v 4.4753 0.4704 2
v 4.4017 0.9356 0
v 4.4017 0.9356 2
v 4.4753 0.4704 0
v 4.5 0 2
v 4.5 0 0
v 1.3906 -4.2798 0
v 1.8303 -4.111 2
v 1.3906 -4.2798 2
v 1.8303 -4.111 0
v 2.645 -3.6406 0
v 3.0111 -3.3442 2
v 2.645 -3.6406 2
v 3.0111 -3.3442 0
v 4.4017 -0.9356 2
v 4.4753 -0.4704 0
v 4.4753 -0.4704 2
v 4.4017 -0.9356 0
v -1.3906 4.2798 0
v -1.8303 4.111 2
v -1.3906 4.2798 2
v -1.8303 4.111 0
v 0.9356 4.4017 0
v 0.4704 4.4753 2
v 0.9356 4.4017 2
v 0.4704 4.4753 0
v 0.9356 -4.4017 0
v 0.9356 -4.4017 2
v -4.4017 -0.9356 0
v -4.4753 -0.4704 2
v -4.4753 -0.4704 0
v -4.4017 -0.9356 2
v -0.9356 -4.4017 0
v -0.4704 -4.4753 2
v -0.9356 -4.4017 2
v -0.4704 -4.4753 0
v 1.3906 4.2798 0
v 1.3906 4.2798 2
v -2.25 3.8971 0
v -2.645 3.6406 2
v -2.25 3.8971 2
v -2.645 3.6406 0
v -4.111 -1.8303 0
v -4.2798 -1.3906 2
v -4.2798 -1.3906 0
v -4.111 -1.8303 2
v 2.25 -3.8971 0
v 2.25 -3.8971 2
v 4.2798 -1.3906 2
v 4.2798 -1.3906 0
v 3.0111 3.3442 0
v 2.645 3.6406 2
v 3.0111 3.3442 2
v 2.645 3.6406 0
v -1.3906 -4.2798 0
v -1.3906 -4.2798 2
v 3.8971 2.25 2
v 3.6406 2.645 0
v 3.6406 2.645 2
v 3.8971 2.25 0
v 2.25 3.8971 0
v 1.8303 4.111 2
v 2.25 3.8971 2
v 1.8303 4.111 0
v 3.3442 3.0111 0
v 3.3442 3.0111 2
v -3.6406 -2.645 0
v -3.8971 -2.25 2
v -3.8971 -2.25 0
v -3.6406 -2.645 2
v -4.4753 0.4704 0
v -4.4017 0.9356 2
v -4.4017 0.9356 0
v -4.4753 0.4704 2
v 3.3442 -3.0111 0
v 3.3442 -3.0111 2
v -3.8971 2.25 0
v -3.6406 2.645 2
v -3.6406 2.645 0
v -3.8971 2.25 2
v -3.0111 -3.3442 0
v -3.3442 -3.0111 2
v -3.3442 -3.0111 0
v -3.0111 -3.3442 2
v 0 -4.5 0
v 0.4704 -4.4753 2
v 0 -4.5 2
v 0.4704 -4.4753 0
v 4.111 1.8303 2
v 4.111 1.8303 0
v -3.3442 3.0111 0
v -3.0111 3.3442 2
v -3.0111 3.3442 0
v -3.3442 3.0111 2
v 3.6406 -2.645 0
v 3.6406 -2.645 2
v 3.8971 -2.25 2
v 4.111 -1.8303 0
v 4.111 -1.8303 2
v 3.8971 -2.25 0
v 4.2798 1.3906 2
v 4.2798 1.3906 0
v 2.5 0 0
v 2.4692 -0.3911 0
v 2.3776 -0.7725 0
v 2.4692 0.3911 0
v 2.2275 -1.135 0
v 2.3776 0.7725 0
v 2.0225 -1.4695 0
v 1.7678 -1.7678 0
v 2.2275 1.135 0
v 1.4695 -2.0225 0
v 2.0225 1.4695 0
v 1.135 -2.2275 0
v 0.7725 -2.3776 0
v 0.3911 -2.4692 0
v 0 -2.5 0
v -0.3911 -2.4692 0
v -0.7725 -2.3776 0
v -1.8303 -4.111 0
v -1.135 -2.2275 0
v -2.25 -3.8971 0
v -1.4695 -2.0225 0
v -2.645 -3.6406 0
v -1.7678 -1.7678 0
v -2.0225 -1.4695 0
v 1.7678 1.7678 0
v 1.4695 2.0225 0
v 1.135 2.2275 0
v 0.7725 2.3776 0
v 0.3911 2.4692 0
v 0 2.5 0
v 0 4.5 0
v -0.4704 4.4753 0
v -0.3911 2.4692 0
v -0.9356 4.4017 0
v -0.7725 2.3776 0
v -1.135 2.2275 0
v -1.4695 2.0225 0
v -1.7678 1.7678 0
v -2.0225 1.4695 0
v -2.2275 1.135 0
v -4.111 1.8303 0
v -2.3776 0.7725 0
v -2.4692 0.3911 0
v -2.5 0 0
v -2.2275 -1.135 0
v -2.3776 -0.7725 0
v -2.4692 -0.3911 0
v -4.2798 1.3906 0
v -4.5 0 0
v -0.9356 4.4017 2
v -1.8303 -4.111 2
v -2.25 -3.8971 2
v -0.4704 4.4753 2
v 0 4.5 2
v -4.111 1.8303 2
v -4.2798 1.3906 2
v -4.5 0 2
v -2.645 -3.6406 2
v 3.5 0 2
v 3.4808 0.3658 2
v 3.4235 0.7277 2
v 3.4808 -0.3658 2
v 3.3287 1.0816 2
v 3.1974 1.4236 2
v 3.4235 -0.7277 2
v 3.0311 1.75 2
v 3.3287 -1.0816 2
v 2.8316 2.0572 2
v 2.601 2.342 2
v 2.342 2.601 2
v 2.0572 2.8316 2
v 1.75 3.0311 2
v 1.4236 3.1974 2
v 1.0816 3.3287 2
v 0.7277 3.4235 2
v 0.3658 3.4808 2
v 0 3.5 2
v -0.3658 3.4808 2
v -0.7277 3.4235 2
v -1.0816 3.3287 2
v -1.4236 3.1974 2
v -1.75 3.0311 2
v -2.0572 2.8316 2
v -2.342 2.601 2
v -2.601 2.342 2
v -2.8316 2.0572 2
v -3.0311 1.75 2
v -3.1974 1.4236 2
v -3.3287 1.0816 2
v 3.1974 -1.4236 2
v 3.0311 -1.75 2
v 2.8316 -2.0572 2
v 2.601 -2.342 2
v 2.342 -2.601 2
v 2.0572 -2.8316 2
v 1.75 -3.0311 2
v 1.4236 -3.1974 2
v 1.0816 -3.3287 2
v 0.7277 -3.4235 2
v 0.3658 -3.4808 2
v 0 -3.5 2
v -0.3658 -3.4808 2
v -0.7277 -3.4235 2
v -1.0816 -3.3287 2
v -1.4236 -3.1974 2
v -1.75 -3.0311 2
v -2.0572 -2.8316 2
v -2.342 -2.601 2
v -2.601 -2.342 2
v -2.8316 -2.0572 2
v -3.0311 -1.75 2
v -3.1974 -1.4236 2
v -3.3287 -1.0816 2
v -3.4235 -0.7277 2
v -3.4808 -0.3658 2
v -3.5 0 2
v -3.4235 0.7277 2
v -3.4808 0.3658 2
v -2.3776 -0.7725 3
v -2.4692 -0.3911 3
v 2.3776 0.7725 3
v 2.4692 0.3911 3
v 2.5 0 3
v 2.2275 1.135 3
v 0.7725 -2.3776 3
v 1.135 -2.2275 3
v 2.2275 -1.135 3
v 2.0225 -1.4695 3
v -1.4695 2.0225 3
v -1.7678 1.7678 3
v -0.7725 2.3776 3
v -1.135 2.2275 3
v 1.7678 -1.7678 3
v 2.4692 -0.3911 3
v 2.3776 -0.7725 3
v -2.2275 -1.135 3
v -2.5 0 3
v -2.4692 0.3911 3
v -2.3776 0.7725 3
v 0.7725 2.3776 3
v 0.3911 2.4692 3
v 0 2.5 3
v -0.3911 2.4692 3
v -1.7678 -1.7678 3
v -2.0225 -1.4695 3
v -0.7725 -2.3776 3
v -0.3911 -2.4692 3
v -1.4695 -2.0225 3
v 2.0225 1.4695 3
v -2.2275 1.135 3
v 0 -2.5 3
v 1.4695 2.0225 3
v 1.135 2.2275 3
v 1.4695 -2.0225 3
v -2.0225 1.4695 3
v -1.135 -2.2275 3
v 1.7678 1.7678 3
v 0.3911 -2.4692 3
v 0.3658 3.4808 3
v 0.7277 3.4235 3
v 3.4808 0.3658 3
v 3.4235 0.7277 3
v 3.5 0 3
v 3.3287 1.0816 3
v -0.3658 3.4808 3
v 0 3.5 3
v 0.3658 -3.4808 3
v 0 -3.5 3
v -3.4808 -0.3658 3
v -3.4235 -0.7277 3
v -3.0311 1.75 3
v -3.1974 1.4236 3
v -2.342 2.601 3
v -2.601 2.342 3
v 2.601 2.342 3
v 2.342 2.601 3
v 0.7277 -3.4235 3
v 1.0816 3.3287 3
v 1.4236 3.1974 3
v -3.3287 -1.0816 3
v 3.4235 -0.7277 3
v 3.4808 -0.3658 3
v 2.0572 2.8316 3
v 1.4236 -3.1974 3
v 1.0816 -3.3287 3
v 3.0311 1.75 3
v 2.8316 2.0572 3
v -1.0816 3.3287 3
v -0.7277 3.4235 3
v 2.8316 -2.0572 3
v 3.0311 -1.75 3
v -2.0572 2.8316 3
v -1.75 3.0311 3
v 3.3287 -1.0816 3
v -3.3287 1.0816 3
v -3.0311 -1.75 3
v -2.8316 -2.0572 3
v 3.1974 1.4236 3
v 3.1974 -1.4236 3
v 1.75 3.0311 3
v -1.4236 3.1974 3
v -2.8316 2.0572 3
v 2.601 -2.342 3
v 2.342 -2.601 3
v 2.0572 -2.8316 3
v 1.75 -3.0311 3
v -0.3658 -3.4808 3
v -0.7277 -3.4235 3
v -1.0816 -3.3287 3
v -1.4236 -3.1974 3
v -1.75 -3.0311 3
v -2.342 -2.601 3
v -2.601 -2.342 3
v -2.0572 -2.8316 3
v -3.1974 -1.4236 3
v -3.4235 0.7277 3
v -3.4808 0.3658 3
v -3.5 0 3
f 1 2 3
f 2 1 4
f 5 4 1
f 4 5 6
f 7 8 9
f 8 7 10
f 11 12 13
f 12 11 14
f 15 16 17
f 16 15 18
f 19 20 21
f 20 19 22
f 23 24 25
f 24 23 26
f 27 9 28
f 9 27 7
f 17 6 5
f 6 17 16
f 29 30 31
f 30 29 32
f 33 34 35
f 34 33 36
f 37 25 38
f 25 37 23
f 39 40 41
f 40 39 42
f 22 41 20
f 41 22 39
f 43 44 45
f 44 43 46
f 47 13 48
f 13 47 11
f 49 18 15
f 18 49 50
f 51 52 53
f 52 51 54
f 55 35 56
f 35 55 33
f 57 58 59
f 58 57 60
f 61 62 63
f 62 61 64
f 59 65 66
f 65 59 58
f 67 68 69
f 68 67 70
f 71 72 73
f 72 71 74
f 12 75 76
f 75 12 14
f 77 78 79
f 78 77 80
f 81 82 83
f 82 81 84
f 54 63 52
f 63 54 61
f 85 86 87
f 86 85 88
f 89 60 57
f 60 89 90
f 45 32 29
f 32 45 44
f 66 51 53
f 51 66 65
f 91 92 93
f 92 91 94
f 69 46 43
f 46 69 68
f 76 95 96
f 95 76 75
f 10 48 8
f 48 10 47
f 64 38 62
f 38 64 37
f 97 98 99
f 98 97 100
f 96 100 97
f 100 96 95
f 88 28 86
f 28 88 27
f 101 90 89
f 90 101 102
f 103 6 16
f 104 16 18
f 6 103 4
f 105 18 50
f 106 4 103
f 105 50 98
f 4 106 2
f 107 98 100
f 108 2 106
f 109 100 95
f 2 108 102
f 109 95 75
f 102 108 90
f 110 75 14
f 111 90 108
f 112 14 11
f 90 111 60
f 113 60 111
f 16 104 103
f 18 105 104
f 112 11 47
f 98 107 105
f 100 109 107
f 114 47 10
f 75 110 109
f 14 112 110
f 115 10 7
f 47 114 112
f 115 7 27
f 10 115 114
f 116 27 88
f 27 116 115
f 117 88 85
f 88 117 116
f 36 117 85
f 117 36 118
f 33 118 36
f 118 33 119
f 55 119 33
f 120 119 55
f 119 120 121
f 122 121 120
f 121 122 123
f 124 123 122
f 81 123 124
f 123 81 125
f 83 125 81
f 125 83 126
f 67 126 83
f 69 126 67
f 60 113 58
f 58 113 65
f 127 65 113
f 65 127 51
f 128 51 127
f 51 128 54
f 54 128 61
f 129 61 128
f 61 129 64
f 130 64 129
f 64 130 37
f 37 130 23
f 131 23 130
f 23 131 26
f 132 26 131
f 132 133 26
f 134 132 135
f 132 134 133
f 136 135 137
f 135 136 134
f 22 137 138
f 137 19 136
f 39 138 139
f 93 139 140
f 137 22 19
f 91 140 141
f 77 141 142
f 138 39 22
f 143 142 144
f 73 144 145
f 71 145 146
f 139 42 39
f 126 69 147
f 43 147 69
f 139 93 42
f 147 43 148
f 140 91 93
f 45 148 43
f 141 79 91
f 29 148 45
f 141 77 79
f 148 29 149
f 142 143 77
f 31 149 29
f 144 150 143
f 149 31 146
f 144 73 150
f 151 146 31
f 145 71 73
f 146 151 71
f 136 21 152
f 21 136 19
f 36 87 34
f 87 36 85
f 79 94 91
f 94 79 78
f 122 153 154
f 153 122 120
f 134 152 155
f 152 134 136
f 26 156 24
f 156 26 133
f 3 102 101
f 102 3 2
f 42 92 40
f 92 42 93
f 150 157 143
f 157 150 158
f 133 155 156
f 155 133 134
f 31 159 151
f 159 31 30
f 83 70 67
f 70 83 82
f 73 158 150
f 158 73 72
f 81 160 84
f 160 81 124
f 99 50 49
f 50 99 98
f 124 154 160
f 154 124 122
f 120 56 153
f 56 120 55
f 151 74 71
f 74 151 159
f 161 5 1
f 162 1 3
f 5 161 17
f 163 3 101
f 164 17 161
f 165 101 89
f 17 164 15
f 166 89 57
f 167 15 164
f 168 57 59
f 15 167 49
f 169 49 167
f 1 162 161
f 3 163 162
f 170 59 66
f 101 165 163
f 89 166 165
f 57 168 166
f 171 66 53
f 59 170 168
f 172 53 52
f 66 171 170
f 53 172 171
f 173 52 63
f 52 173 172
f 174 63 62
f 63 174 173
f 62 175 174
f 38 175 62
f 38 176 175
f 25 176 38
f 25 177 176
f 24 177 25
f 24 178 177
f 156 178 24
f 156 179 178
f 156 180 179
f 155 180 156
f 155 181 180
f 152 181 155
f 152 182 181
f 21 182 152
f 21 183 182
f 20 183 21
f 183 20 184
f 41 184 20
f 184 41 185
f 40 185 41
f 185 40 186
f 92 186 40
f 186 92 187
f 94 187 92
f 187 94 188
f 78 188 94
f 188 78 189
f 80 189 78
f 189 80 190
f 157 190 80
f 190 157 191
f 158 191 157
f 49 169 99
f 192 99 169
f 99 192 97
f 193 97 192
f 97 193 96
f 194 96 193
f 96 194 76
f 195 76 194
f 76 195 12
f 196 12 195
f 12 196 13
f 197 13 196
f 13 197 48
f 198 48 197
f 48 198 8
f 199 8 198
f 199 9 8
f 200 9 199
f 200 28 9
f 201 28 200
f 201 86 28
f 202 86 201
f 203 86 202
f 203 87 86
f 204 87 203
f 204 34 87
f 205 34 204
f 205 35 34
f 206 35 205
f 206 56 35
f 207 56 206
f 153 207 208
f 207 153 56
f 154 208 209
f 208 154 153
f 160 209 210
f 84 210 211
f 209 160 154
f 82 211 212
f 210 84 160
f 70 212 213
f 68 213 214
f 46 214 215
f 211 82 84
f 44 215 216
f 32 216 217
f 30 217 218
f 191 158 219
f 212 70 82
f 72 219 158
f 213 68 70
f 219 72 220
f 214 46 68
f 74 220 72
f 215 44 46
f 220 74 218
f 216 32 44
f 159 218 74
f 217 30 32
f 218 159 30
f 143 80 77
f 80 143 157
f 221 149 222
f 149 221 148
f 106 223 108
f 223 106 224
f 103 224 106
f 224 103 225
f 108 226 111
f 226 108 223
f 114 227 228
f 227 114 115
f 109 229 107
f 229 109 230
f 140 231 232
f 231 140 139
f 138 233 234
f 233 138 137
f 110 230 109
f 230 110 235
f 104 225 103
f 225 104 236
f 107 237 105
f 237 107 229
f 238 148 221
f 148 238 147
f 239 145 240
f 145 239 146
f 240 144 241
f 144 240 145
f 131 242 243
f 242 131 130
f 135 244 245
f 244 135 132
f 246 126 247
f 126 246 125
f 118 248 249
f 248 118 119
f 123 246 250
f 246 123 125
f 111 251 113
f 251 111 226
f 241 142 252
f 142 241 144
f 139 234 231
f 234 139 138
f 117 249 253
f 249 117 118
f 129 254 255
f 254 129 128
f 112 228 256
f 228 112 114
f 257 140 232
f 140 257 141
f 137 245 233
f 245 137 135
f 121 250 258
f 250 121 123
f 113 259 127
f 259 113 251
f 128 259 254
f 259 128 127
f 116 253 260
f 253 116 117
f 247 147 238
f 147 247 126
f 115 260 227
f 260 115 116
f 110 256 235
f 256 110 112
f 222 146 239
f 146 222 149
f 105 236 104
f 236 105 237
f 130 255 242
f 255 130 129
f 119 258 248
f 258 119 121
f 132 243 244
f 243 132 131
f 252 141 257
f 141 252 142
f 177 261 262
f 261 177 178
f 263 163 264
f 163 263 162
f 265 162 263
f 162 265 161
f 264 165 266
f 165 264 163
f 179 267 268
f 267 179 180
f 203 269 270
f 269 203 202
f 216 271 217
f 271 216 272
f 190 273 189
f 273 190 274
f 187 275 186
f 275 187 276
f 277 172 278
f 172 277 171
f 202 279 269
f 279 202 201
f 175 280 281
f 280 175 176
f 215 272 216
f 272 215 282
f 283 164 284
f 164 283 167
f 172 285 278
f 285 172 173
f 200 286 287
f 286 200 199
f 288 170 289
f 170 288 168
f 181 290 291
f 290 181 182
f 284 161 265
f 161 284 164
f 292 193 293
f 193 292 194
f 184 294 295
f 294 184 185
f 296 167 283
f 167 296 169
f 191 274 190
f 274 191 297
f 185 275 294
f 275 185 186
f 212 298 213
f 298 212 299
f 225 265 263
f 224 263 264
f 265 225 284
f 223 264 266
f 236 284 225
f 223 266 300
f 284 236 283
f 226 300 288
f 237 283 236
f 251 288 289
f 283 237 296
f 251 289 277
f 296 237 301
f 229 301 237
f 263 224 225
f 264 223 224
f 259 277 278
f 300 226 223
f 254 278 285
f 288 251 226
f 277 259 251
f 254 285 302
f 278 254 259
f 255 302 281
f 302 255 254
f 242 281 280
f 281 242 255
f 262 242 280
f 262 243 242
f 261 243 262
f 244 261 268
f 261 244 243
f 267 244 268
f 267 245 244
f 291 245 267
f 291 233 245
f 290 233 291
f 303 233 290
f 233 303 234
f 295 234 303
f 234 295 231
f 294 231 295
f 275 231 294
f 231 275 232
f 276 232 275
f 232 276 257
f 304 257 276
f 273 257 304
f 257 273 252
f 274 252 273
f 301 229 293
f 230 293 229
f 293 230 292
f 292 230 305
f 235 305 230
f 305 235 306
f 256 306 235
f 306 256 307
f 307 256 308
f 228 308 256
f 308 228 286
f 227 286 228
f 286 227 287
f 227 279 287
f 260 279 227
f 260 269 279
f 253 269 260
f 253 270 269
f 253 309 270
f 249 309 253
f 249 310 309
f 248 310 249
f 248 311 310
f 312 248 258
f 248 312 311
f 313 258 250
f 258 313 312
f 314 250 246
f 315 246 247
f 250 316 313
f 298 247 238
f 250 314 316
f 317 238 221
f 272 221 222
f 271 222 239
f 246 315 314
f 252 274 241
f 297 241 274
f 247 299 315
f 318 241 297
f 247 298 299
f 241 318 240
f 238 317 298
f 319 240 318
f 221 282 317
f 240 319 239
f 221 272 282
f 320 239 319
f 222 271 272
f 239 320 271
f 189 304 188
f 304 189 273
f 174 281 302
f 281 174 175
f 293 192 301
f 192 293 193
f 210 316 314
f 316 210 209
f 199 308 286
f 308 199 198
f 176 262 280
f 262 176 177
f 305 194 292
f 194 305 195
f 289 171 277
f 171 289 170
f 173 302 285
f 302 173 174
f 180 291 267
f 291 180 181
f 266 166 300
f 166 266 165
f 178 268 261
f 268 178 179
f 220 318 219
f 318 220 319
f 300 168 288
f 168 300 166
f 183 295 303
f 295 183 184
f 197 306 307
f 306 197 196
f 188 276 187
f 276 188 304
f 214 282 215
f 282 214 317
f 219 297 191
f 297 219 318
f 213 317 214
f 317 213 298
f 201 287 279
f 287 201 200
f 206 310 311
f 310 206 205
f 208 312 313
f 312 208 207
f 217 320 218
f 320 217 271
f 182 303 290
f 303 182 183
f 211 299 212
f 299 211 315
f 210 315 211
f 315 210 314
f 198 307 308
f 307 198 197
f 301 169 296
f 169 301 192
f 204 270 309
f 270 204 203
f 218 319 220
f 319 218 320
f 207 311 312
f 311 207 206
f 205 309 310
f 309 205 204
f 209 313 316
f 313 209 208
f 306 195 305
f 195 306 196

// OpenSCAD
// part_id: sp10
// name: SP10 sp2 axle disc (spacer)
// source_drawing_ids: DRW-022
// units: mm
// revision: 0.1-drw022
// SPDX-License-Identifier: MIT
//
// Dimensions from DRW-022 sheet 6:
//   Stepped disc: Ø9.0 outer, Ø7.0 mid step, Ø5.0 bore.
//   Total height: 2.0 mm (outer flange), boss adds ~1.0 mm.

module part_sp10(
    od      = 9.0,
    mid_d   = 7.0,
    bore_d  = 5.0,
    h_flange = 2.0,
    h_boss   = 1.0
) {
    union() {
        // Outer flange disc.
        difference() {
            cylinder(d = od, h = h_flange, center = false, $fn = 60);
            translate([0, 0, -0.1]) cylinder(d = bore_d, h = h_flange + 0.2, center = false, $fn = 40);
        }
        // Central stepped boss.
        difference() {
            cylinder(d = mid_d, h = h_flange + h_boss, center = false, $fn = 60);
            translate([0, 0, -0.1]) cylinder(d = bore_d, h = h_flange + h_boss + 0.2, center = false, $fn = 40);
        }
    }
}


// ---- "main guard" ----
// Default to previewing when opened directly:
if (is_undef(__LIB_MODE__)) {
    part_sp10();
}
